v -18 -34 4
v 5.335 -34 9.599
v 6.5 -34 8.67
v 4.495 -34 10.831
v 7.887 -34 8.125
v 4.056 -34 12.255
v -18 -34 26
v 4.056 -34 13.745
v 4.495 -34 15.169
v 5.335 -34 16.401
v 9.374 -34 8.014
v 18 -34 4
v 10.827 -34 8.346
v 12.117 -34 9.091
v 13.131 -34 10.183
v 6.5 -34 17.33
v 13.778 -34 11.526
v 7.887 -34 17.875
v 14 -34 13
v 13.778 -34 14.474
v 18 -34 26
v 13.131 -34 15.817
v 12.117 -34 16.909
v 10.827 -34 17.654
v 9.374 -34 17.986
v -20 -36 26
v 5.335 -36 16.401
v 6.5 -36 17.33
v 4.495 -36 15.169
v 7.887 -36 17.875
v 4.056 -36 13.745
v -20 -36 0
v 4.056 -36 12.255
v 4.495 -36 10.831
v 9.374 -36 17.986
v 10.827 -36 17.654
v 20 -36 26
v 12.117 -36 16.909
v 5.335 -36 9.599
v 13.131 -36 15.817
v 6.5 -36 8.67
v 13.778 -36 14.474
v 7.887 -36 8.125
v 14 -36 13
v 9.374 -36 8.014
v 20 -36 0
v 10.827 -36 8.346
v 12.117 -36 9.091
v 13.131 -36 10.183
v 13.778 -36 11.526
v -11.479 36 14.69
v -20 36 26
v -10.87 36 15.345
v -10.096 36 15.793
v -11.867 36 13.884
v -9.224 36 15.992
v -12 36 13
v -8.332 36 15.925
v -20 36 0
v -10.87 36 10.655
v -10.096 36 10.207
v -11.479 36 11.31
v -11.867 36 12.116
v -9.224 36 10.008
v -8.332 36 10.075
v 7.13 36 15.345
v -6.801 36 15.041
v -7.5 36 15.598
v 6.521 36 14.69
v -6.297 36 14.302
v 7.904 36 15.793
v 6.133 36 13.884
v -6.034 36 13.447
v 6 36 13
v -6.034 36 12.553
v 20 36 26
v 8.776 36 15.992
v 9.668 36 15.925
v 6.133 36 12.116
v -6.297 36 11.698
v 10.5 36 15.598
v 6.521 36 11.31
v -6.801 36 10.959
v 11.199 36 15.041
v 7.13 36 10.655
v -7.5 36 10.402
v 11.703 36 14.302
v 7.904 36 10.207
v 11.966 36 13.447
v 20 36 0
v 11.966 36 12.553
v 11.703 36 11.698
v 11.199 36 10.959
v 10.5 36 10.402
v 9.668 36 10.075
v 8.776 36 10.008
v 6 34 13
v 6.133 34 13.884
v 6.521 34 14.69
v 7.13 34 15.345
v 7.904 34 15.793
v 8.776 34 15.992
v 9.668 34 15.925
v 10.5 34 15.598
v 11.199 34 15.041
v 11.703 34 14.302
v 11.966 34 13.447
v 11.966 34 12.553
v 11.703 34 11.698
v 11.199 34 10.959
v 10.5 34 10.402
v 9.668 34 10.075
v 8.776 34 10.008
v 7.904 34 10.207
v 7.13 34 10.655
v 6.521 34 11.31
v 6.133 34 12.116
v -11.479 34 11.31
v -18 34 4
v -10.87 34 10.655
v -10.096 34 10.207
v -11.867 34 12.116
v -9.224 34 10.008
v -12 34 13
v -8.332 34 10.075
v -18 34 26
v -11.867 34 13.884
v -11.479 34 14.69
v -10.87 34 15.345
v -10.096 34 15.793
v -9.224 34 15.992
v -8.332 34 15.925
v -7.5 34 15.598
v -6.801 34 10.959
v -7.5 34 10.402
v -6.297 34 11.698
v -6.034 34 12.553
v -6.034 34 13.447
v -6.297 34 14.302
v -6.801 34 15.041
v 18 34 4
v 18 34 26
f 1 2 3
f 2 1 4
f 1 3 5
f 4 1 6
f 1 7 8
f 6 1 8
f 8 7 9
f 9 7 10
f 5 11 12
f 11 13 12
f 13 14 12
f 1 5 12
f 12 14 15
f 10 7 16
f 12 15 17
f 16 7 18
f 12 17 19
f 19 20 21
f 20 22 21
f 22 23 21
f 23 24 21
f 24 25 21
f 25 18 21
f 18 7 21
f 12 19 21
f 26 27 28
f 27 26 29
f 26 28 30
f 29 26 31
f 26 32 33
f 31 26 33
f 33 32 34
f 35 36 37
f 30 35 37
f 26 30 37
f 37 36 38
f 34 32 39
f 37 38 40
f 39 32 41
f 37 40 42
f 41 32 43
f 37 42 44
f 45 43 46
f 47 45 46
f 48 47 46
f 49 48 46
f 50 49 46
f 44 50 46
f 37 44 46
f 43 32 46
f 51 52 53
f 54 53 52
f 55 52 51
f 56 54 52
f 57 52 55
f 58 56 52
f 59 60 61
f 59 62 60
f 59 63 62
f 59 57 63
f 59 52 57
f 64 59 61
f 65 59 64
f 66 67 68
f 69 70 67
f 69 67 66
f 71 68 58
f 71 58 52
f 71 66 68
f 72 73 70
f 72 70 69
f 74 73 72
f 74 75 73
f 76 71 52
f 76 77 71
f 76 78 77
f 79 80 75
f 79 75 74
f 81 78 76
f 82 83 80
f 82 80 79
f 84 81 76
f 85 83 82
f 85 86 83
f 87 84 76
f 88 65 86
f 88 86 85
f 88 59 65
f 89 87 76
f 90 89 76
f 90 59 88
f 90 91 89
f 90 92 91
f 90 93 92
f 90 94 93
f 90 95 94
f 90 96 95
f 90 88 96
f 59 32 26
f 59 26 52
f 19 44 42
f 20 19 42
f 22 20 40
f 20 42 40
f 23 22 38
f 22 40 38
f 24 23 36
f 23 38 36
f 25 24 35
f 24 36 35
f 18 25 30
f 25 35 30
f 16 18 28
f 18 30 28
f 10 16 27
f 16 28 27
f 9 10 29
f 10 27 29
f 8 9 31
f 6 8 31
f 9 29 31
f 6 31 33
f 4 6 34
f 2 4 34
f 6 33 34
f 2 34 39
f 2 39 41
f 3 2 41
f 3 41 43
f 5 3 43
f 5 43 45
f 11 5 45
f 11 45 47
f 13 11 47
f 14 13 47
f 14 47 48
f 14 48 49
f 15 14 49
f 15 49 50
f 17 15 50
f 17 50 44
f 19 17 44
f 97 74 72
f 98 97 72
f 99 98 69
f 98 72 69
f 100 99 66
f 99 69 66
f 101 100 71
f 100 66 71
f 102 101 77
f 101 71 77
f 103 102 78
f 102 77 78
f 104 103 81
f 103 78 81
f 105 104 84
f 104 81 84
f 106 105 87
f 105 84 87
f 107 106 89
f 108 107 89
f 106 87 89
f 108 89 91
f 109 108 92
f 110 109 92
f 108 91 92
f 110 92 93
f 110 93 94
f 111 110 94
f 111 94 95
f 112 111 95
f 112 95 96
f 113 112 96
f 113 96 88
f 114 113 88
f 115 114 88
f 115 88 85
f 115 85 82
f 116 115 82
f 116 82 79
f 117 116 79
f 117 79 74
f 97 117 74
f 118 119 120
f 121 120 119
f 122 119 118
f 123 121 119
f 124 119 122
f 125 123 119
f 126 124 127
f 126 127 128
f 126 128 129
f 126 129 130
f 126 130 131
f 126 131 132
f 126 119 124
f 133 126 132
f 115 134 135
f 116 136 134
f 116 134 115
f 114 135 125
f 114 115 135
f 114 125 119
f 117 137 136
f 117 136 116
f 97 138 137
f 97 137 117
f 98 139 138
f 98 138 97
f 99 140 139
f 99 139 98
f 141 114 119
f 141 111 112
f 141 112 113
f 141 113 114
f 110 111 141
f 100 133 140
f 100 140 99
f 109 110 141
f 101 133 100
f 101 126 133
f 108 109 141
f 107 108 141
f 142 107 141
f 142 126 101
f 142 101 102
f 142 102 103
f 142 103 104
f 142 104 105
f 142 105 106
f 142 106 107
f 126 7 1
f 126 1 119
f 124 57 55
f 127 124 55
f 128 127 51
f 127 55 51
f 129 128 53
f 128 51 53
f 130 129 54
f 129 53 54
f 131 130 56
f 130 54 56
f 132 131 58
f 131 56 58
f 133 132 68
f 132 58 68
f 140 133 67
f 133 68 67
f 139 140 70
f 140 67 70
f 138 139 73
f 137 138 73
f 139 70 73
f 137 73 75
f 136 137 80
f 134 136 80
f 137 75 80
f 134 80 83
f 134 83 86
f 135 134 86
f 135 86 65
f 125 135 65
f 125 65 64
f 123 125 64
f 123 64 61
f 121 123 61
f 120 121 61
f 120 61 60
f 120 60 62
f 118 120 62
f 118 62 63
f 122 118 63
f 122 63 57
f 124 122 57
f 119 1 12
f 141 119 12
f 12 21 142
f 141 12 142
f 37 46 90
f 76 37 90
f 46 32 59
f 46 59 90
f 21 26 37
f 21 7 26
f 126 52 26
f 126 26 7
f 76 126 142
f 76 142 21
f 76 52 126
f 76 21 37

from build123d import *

# Parameters (mm, degrees)
F0_W     = 40
F0_H     = 72
F1_DEPTH = 26
F2_W     = 36
F2_H     = 68
F3_DEPTH = 22
F4_R     = 5
F5_DEPTH = 25
F6_R     = 3
F7_DEPTH = 25


with BuildPart() as f1:
    # F0 (on Top) → F1 (new body)
    with BuildSketch(Plane.XY):
        Rectangle(F0_W, F0_H)
    extrude(amount=F1_DEPTH)

    # F2 (on face) → F3 (cut)
    with BuildSketch(Plane.XY.offset(26)):
        Rectangle(F2_W, F2_H)
    extrude(amount=-F3_DEPTH, mode=Mode.SUBTRACT)

    # F4 (on face) → F5 (cut)
    with BuildSketch(Plane.XZ.offset(36)):
        with Locations((9, 13)):
            Circle(F4_R)
    extrude(amount=-F5_DEPTH, mode=Mode.SUBTRACT)

    # F6 (on face) → F7 (cut)
    with BuildSketch(Plane(origin=(0, 36, 0), x_dir=(-1, 0, 0), z_dir=(0, 1, 0))):
        with Locations((-9, 13)):
            Circle(F6_R)
        with Locations((9, 13)):
            Circle(F6_R)
    extrude(amount=-F7_DEPTH, mode=Mode.SUBTRACT)


solid = f1.part
